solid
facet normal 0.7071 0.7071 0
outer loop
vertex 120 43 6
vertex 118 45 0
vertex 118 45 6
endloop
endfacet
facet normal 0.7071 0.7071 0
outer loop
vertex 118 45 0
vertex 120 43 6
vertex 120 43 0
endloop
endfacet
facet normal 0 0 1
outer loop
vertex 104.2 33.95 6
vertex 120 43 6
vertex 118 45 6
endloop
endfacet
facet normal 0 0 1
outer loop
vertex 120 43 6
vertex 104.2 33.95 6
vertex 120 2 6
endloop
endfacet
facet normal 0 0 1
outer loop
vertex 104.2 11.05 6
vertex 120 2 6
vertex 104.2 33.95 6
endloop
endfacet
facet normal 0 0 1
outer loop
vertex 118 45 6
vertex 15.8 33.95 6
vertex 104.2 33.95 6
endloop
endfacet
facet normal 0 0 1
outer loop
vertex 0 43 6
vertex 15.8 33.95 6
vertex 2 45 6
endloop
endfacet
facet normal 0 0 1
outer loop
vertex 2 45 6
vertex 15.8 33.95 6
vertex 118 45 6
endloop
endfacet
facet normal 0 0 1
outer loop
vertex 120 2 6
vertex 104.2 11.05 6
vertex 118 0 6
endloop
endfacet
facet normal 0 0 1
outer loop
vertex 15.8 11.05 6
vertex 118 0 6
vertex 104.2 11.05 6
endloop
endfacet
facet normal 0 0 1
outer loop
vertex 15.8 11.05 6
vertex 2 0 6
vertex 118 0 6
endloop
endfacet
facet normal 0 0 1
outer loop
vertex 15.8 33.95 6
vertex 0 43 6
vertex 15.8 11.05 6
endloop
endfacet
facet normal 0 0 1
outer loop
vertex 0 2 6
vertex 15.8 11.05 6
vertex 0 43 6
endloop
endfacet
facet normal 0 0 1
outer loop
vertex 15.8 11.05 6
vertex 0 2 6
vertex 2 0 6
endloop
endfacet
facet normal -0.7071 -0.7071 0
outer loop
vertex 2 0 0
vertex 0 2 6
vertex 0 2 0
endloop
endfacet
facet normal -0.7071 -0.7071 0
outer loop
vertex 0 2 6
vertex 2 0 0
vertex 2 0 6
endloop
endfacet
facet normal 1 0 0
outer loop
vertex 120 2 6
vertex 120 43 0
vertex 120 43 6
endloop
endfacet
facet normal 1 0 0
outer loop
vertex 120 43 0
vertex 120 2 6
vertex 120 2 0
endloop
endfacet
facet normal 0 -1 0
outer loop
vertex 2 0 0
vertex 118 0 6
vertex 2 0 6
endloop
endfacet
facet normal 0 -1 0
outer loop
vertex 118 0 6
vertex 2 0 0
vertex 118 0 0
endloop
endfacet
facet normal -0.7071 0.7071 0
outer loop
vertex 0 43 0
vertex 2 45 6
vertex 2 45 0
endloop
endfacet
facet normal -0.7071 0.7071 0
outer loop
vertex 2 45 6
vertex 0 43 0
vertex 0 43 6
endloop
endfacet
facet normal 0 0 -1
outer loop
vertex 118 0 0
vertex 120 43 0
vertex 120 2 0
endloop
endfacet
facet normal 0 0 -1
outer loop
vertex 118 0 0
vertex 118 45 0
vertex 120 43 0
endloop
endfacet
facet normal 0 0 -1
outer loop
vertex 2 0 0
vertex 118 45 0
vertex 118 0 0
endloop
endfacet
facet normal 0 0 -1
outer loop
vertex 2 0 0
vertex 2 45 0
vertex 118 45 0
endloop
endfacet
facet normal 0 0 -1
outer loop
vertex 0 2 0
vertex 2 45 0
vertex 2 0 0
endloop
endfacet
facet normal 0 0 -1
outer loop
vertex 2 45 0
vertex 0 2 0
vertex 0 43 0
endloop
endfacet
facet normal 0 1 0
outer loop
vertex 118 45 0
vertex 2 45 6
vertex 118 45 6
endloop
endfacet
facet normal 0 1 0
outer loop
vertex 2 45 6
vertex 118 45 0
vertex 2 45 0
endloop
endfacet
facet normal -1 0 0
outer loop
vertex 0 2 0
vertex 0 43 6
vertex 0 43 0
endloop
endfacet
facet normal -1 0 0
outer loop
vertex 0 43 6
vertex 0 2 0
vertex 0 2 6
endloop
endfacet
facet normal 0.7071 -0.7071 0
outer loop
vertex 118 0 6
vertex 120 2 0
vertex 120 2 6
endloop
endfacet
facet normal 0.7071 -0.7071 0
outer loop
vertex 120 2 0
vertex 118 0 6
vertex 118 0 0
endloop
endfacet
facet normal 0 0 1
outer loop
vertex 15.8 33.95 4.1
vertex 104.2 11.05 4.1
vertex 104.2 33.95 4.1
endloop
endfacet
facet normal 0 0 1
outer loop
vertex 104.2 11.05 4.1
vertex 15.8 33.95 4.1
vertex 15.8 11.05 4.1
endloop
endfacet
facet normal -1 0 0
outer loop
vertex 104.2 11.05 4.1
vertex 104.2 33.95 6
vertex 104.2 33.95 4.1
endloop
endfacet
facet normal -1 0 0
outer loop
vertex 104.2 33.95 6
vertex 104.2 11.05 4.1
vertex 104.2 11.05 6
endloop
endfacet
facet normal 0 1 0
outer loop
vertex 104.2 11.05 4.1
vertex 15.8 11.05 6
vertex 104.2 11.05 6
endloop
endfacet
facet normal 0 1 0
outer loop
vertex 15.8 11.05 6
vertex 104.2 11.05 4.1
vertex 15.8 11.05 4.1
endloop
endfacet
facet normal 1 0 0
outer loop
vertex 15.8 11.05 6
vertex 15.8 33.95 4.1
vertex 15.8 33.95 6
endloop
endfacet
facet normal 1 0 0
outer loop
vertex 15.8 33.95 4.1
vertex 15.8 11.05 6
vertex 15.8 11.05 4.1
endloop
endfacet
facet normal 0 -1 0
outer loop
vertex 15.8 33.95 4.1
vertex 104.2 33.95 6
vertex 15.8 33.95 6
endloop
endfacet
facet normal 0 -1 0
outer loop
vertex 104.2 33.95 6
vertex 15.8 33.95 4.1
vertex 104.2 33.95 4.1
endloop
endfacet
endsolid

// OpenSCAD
$fn = 32;

// ----------------------------------------------------------------------
// Windowed plate: 1 voids, 120 x 45 x 6 mm
// ----------------------------------------------------------------------

// --- parameters (mm) ---
plate_l = 120;            // plate length, X
plate_w = 45;             // plate width, Y
plate_t = 6;              // plate thickness, Z
edge_margin = 8;          // wall from the plate edge to any window
win1_l = 88.4;            // window length
win1_w = 22.9;            // window width
depth_1 = 1.9;            // depth of void 1 (full thickness = through)
corner_c = 2;             // corner chamfer of the plate

profile = [[2, 0], [118, 0], [120, 2], [120, 43], [118, 45], [2, 45], [0, 43], [0, 2]];  // primary outline, 8 points, counter clockwise
void_1 = [[15.8, 11.05], [104.2, 11.05], [104.2, 33.95], [15.8, 33.95]];  // large central window, 4 points

// --- the one profile operation ---
difference() {
  linear_extrude(height = plate_t) polygon(points = profile);
  translate([0, 0, plate_t - depth_1])
    linear_extrude(height = depth_1 + 1) polygon(points = void_1);
}
